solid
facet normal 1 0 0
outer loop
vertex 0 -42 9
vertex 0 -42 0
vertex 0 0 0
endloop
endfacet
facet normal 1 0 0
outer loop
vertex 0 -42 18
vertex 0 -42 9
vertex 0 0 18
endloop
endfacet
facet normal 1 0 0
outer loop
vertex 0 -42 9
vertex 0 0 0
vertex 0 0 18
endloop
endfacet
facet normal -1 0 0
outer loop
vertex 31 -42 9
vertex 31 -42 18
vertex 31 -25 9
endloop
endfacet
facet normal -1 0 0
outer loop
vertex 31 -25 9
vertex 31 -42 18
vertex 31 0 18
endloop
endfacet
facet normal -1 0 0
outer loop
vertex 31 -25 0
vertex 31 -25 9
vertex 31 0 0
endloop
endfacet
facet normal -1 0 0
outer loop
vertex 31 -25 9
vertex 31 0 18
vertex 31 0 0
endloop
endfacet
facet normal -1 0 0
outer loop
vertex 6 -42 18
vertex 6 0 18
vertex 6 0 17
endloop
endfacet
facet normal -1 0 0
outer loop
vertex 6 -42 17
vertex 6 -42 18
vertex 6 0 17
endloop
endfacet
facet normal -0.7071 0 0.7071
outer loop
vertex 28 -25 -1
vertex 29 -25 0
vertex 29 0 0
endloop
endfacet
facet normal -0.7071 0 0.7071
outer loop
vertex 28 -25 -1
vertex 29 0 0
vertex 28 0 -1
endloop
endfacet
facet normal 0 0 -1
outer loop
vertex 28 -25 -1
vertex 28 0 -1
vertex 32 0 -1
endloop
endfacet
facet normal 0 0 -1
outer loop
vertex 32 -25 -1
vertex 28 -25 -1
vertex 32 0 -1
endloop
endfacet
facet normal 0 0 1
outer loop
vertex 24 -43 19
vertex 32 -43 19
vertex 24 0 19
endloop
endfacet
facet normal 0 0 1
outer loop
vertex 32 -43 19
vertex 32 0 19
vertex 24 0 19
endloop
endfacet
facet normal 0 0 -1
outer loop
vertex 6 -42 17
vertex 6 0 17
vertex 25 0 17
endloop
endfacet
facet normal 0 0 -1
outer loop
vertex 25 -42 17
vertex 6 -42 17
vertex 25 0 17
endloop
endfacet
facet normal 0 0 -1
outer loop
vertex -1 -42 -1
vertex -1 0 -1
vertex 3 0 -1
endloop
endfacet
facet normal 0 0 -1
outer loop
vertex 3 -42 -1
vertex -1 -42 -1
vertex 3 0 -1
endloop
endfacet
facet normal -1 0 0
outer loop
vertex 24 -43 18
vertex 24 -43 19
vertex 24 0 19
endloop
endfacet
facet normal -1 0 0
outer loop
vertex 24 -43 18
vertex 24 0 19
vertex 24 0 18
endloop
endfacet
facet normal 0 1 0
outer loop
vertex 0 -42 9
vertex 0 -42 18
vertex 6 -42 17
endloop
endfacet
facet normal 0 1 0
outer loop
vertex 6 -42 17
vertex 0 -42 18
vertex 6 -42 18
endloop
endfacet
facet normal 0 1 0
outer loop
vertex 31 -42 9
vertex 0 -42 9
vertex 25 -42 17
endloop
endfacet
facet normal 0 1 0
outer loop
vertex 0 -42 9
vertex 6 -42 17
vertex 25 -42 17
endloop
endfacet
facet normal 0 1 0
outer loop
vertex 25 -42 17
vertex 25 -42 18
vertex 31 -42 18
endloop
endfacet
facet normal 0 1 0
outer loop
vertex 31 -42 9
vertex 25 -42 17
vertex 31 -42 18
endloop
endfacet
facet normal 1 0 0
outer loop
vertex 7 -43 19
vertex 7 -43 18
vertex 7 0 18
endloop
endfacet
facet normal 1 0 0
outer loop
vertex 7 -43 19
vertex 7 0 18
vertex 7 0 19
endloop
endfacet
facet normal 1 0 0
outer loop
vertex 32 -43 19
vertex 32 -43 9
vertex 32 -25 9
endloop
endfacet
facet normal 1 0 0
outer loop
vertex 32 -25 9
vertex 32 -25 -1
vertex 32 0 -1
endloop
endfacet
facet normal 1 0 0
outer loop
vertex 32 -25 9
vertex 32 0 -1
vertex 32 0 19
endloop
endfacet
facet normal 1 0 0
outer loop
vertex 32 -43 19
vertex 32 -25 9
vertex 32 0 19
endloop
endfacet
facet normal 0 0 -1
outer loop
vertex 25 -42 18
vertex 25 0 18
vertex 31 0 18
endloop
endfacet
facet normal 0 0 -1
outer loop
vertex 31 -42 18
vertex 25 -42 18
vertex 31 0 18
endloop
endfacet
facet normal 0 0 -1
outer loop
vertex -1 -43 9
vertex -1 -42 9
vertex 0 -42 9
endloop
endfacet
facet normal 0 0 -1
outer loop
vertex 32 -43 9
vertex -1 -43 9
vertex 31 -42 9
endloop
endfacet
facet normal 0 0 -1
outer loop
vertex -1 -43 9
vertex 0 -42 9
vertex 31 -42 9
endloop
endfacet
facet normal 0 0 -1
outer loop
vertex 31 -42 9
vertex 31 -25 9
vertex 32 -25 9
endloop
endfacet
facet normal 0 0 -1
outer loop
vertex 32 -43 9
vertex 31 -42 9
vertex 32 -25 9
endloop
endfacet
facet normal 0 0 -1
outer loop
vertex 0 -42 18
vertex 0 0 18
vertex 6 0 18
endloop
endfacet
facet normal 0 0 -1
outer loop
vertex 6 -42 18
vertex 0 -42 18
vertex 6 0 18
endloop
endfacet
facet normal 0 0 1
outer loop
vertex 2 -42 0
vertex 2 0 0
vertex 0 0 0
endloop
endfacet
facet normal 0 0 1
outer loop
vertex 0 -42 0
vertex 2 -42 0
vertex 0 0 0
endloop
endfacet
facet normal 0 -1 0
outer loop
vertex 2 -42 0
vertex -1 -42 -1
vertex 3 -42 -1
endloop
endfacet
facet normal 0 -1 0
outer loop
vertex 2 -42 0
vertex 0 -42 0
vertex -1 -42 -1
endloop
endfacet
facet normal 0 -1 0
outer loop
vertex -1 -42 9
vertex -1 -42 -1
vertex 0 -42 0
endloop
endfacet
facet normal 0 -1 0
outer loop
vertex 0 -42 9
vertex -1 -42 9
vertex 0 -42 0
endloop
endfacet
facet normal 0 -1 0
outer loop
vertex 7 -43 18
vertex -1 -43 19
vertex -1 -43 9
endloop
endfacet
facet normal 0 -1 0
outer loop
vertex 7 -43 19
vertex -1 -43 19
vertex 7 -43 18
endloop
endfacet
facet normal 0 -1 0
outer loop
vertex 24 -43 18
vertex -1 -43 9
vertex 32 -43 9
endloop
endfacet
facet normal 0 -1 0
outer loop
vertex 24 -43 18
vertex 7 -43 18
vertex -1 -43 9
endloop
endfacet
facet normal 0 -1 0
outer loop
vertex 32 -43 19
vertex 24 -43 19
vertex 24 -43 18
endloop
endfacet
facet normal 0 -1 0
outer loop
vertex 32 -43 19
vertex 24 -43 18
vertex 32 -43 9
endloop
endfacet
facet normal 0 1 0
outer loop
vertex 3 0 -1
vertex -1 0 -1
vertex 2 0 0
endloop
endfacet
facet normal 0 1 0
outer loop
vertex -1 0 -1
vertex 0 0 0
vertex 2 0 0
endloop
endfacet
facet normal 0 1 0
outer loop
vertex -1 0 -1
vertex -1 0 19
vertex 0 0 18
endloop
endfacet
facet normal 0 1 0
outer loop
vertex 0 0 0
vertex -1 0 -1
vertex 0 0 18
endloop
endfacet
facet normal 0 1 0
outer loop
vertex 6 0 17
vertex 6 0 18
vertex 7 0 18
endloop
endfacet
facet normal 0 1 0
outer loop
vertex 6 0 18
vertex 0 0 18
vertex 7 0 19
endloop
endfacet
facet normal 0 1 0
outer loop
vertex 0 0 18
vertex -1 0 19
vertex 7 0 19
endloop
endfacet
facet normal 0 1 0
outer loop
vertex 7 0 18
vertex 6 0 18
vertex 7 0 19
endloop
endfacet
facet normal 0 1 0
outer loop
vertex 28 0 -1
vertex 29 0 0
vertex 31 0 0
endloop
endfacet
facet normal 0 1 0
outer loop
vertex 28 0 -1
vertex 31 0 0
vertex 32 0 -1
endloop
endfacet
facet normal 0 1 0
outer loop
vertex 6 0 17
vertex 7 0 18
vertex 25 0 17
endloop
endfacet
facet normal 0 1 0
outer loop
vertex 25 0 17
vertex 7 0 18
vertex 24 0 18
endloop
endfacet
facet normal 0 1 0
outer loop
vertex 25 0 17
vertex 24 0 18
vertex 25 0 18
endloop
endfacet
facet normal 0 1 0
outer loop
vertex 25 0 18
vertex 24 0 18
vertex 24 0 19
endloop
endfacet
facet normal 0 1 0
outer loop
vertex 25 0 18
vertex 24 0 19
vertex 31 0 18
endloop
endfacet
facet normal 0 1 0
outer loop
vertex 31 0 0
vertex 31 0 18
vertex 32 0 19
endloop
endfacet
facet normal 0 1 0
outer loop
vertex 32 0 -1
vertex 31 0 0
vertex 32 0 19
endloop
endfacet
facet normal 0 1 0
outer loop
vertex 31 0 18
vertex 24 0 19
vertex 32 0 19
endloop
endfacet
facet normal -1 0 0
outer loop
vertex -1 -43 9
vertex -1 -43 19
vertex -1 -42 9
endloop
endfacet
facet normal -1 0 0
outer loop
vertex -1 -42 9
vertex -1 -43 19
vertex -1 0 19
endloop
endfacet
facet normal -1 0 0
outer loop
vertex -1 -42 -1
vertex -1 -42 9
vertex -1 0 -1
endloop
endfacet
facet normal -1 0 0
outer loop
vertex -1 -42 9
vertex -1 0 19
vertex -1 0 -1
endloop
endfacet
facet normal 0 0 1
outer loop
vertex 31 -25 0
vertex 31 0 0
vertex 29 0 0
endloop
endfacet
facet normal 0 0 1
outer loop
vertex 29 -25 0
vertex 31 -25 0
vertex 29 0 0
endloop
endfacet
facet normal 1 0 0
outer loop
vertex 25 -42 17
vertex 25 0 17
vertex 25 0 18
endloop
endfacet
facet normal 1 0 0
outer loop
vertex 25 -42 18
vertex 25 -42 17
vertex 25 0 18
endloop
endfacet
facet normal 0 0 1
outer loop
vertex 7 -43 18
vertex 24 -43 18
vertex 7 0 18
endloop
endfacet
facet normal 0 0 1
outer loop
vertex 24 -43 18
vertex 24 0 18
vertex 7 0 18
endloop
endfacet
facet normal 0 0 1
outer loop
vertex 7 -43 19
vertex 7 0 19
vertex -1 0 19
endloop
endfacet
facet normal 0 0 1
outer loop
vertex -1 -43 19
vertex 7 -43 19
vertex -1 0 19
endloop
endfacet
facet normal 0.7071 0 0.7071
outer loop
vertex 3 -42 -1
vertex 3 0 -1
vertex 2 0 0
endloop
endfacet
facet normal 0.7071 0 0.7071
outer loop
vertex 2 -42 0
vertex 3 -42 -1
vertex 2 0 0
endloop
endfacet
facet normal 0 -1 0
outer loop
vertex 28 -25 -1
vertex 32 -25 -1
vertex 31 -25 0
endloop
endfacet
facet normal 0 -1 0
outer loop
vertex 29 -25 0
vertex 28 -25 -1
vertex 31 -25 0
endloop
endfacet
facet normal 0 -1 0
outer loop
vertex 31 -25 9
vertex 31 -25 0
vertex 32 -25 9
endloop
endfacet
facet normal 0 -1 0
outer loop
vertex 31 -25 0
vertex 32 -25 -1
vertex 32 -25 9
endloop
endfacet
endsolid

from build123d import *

# Parameters (mm, degrees)
F1_DEPTH = 42
F2_W     = 17
F2_H     = 10
F3_DEPTH = 5
F5_DEPTH = 1


with BuildPart() as f1:
    # F0 (on Front) → F1 (new body)
    with BuildSketch(Plane.XZ):
        Polygon((2, 0), (0, 0), (0, 18), (6, 18), (6, 17), (25, 17), (25, 18), (31, 18), (31, 0), (29, 0), (28, -1), (32, -1), (32, 19), (24, 19), (24, 18), (7, 18), (7, 19), (-1, 19), (-1, -1), (3, -1), align=None)
    extrude(amount=F1_DEPTH)

    # F2 (on face) → F3 (cut)
    with BuildSketch(Plane.YZ.offset(32)):
        with Locations((-33.5, 4)):
            Rectangle(F2_W, F2_H)
    extrude(amount=-F3_DEPTH, mode=Mode.SUBTRACT)

    # F4 (on face) → F5 (join)
    with BuildSketch(Plane.XZ.offset(42)):
        Polygon((-1, 9), (32, 9), (32, 19), (24, 19), (24, 18), (7, 18), (7, 19), (-1, 19), align=None)
    extrude(amount=F5_DEPTH)


solid = f1.part
